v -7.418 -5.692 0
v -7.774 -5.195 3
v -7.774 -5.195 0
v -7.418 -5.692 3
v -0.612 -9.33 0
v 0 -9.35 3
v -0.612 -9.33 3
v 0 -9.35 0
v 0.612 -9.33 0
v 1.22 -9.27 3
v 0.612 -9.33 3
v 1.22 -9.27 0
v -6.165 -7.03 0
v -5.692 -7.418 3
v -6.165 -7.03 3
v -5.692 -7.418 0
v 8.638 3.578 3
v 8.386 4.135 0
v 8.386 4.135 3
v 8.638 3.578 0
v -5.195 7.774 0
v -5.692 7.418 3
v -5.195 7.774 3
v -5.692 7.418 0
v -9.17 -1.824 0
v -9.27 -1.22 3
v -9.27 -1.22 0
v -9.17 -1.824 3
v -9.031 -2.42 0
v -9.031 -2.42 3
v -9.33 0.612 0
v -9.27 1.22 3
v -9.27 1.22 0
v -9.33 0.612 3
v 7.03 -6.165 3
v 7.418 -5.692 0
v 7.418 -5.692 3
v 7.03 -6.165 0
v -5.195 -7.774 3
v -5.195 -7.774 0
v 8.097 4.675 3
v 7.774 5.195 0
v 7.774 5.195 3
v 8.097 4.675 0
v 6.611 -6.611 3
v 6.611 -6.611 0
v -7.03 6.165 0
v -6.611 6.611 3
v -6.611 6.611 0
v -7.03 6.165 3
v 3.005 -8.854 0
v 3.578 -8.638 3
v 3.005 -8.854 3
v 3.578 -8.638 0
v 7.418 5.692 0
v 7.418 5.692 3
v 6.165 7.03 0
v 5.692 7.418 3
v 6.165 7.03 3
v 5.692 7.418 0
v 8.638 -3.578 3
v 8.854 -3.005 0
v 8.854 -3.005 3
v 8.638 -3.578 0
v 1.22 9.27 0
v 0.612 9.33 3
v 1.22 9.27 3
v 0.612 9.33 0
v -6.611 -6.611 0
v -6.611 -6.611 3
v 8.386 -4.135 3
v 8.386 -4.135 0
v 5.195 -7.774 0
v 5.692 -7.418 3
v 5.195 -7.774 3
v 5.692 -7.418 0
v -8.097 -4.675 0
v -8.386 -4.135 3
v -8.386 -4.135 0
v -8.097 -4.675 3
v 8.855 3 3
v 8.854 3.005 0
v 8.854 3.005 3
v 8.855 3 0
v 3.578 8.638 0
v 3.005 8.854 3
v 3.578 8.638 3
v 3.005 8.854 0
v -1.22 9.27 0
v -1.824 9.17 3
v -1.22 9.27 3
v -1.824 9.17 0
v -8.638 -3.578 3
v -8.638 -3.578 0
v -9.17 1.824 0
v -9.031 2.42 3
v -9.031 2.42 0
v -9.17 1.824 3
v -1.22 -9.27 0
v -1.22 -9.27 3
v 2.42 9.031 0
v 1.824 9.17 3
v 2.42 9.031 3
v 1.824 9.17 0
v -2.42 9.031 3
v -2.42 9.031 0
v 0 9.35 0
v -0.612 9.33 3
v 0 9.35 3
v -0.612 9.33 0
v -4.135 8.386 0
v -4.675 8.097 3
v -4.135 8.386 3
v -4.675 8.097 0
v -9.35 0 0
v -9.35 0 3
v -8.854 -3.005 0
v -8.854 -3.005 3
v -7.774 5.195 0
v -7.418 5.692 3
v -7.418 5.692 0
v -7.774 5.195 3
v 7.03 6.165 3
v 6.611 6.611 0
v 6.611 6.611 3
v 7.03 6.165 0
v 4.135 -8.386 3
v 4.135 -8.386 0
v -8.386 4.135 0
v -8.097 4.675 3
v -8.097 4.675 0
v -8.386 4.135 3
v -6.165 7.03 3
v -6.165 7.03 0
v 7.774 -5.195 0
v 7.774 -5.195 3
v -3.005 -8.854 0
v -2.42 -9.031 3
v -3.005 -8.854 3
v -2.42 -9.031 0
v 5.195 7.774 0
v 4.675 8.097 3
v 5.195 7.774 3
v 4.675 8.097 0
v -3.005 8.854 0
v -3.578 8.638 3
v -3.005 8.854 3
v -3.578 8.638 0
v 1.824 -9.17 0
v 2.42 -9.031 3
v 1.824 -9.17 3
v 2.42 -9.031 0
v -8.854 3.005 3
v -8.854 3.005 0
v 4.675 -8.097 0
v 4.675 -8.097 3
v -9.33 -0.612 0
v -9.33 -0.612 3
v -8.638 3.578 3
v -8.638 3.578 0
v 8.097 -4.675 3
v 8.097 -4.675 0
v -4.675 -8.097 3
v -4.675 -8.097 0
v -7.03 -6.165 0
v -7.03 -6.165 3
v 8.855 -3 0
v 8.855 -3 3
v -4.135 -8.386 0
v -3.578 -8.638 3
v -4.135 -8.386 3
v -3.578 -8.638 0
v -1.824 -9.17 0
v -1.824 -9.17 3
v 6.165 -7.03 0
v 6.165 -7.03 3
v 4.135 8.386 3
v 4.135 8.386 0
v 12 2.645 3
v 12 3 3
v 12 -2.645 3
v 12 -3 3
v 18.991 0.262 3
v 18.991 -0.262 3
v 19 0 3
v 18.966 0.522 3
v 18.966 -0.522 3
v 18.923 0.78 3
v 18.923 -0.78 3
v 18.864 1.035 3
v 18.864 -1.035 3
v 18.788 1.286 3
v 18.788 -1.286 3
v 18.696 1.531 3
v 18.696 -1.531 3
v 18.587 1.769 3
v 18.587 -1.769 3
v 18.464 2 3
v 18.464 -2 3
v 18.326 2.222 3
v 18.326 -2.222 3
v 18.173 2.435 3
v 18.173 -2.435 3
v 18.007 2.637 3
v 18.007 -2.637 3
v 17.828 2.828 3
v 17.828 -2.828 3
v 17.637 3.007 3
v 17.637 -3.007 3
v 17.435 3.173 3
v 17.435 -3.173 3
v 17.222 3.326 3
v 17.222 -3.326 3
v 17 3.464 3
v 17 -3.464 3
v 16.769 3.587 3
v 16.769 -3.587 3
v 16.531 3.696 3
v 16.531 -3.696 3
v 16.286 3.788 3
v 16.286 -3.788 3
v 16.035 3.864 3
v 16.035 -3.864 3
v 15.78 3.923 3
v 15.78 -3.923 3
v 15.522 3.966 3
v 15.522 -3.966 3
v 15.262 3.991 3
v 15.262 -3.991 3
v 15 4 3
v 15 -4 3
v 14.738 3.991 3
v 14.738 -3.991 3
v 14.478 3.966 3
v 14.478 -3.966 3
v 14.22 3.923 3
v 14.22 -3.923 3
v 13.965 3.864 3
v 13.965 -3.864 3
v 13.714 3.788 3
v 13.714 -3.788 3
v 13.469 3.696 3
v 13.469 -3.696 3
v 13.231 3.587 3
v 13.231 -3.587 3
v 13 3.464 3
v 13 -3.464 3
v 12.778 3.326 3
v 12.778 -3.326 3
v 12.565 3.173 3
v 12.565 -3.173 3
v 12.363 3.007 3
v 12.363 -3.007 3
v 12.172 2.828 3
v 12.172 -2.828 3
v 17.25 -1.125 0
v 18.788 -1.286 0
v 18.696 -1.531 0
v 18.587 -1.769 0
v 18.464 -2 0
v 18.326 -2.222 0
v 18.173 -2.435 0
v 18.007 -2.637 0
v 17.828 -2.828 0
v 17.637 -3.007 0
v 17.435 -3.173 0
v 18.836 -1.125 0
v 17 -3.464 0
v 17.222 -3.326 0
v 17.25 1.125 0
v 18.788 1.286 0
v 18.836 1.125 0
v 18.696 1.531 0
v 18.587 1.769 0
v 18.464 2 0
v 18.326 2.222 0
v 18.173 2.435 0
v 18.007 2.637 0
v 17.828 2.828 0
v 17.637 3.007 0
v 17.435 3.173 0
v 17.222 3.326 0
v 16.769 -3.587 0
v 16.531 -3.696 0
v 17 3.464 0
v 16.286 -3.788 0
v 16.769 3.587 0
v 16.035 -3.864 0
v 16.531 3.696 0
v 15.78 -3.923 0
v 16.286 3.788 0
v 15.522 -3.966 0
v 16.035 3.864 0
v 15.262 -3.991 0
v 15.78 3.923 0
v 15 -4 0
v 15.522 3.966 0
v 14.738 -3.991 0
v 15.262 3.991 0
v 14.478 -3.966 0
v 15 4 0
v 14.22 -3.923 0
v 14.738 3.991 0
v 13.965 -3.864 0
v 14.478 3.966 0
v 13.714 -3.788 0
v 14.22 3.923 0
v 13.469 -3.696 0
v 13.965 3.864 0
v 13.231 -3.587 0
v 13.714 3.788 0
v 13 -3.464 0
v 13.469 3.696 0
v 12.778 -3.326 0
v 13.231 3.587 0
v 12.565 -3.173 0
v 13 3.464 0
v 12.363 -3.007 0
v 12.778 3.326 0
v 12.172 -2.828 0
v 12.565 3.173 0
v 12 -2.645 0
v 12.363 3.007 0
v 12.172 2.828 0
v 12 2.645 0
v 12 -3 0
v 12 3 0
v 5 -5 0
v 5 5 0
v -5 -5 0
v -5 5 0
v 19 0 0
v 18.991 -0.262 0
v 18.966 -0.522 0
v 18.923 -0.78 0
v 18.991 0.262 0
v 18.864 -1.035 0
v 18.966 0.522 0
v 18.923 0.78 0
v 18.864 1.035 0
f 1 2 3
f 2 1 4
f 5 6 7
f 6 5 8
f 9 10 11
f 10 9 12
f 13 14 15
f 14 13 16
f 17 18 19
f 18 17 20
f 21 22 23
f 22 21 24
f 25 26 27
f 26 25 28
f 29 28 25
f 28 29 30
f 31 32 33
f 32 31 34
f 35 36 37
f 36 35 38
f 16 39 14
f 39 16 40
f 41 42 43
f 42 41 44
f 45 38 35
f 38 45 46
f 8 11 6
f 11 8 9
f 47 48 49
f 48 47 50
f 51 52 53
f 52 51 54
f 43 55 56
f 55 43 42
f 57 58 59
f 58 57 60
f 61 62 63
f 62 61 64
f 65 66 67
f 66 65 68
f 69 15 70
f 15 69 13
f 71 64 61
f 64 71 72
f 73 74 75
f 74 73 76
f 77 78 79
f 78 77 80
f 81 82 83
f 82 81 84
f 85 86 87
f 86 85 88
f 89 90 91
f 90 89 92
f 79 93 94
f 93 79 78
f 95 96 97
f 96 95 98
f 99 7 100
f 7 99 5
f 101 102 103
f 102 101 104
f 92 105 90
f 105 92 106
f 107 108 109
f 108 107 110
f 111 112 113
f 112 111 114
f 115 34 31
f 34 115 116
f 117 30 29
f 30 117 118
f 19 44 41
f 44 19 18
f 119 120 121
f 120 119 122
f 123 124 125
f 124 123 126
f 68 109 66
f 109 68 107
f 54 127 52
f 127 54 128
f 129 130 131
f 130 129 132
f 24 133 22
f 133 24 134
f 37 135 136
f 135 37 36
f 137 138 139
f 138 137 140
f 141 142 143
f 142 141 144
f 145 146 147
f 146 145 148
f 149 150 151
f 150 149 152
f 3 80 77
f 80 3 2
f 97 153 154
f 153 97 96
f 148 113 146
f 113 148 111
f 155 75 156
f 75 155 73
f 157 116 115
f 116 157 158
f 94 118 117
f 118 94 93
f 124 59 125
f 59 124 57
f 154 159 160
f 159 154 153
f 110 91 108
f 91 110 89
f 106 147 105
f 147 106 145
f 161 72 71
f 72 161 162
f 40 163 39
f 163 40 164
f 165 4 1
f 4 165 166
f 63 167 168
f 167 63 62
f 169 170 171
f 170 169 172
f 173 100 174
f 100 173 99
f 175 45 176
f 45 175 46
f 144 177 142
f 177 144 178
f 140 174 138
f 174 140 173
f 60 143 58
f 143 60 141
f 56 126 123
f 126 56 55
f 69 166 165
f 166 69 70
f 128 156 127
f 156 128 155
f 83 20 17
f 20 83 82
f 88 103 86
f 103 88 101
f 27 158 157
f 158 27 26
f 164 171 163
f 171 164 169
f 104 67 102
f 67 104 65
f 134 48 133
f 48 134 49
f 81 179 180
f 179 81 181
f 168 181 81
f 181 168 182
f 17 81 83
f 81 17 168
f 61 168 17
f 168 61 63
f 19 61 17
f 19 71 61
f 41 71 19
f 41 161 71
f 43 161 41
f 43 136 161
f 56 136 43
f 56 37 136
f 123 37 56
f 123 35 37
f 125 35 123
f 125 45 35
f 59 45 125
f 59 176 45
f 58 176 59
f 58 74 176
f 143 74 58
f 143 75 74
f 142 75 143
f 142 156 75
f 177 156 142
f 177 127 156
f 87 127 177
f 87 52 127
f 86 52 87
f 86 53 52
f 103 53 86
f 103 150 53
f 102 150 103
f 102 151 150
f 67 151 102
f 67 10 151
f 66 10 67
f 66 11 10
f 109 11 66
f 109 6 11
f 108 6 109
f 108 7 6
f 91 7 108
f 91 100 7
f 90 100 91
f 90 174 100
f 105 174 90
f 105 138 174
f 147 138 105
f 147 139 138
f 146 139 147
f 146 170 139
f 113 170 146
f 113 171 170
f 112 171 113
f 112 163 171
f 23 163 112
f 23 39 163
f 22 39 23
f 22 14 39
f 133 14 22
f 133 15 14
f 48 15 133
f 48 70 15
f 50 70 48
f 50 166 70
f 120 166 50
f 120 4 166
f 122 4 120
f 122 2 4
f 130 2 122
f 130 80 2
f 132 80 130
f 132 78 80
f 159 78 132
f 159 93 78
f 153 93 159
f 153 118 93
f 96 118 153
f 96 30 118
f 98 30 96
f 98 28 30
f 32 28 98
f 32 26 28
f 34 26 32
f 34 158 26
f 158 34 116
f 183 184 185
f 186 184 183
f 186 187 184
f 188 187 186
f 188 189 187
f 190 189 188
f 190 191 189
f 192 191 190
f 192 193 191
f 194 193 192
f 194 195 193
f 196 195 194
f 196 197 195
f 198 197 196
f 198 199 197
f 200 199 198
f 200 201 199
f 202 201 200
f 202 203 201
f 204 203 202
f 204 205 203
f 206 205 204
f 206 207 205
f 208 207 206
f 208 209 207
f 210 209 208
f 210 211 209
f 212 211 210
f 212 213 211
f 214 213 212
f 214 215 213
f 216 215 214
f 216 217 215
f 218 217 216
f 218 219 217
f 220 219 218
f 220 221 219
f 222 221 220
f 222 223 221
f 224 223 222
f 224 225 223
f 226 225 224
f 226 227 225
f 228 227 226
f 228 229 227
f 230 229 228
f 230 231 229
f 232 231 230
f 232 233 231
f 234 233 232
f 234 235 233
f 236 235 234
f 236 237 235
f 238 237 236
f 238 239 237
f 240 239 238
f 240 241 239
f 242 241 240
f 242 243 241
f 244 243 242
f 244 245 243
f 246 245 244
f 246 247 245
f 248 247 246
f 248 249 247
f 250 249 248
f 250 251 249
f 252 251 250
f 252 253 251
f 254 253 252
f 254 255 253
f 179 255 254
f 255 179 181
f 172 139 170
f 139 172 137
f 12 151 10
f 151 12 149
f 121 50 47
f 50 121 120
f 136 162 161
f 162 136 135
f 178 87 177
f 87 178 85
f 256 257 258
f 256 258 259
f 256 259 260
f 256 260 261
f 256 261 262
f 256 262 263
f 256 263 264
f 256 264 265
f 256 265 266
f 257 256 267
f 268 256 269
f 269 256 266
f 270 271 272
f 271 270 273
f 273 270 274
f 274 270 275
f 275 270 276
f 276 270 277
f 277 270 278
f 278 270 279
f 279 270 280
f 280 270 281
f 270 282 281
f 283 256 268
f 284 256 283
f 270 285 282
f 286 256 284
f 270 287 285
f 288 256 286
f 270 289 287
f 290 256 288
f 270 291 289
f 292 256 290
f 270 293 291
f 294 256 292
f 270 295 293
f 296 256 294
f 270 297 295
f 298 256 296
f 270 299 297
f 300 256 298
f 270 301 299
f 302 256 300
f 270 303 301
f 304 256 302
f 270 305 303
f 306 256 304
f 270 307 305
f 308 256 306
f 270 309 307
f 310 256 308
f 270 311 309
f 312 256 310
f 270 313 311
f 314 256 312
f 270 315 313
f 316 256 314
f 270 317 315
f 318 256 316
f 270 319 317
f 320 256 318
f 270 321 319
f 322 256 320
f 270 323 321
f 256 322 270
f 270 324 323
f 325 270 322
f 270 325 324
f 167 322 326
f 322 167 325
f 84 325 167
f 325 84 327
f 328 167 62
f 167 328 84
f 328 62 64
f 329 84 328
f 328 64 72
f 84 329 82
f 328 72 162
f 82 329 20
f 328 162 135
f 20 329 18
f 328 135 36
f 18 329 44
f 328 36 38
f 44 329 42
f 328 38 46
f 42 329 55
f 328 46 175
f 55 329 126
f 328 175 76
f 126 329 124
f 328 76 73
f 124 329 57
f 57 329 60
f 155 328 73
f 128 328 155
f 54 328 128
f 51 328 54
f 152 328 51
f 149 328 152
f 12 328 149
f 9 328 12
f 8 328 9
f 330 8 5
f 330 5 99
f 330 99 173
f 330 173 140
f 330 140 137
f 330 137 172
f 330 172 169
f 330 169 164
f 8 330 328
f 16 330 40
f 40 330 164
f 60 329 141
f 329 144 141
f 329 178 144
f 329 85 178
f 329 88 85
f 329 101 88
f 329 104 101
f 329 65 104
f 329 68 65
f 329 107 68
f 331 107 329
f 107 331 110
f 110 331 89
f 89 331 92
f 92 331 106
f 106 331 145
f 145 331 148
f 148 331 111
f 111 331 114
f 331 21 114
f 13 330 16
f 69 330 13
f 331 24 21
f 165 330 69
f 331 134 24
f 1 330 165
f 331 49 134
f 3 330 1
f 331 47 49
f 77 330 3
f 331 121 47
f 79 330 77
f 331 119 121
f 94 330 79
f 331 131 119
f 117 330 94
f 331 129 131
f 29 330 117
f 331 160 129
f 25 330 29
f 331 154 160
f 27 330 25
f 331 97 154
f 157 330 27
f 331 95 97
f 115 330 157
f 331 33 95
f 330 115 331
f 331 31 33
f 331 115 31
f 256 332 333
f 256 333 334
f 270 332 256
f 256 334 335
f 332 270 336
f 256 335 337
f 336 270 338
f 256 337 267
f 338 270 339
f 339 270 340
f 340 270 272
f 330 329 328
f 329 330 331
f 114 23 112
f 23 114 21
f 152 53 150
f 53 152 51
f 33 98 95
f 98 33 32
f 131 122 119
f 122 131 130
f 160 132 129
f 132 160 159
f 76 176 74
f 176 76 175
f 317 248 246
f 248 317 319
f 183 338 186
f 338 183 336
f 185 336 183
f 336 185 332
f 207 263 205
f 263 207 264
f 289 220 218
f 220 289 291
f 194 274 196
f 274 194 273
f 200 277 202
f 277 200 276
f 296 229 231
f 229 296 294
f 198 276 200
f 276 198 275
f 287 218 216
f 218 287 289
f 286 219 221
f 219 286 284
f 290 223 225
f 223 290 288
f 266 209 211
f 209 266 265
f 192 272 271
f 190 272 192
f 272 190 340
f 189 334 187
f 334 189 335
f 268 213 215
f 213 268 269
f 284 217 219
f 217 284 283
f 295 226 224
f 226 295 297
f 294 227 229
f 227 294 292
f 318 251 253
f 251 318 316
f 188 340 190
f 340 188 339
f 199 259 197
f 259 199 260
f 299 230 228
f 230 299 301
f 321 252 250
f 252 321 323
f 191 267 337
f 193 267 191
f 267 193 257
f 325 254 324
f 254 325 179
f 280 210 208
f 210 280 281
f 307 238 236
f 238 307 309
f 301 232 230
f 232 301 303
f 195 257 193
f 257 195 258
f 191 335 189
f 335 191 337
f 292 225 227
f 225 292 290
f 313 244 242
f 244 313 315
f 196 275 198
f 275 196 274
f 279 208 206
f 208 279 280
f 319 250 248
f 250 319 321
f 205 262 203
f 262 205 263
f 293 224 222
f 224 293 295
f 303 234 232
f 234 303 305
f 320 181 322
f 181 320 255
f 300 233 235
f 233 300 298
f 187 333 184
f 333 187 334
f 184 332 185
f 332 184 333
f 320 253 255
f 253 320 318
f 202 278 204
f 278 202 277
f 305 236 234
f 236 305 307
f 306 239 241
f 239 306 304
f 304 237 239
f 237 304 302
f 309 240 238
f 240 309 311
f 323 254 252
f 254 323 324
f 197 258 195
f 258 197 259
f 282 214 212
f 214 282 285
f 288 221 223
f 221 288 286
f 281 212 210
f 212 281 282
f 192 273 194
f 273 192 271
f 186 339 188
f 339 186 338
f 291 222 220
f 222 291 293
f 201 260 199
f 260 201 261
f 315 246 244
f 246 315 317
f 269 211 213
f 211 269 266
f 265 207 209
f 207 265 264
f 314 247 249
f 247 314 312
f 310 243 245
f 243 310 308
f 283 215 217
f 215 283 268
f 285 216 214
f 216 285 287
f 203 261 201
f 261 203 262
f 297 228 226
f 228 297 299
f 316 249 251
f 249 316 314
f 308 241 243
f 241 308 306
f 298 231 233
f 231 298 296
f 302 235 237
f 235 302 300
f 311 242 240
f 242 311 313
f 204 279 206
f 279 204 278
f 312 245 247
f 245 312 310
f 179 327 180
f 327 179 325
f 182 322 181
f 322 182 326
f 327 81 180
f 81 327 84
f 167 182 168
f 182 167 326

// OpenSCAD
// Snap-on tubing clip for a 12.7 mm lab stand rod
// Print orientation: flat on the bed, extruded along +Z

// ---------------- Parameters ----------------
ring_od      = 18.7;   // rod ring outer diameter
ring_id      = 12.7;   // rod ring inner diameter
ring_w       = 3;      // rod ring wall thickness
ring_open    = 10;     // width of the -X side opening (y = +/-5)

tube_od      = 8;      // tubing ring outer diameter
tube_id      = 6;      // tubing ring inner diameter
tube_w       = 2;      // tubing ring wall thickness
tube_open    = 4.5;    // width of the +X side opening (y = +/-2.25)

bridge_x0    = 8;      // bridge start (x)
bridge_x1    = 12;     // bridge end (x)
bridge_y     = 6;      // bridge width (y)

eps          = 0.5;    // cutter overshoot past faces
$fn          = 96;     // curve resolution

// ---------------- Model ----------------
difference() {
    union() {
        // Rod ring
        cylinder(d = ring_od, h = ring_w);
        // Tubing ring
        translate([15, 0, 0])
            cylinder(d = tube_od, h = ring_w);
        // Solid bridge between the rings
        translate([bridge_x0, -bridge_y / 2, 0])
            cube([bridge_x1 - bridge_x0, bridge_y, ring_w]);
    }

    // Opening in the rod ring (-X side)
    translate([-ring_open / 2, -5, -eps])
        cube([ring_open, 10, eps]);

    // Opening in the tubing ring (+X side)
    translate([15 + tube_open / 2, -tube_open / 4, -eps])
        cube([tube_open, tube_open / 2, eps]);
}
